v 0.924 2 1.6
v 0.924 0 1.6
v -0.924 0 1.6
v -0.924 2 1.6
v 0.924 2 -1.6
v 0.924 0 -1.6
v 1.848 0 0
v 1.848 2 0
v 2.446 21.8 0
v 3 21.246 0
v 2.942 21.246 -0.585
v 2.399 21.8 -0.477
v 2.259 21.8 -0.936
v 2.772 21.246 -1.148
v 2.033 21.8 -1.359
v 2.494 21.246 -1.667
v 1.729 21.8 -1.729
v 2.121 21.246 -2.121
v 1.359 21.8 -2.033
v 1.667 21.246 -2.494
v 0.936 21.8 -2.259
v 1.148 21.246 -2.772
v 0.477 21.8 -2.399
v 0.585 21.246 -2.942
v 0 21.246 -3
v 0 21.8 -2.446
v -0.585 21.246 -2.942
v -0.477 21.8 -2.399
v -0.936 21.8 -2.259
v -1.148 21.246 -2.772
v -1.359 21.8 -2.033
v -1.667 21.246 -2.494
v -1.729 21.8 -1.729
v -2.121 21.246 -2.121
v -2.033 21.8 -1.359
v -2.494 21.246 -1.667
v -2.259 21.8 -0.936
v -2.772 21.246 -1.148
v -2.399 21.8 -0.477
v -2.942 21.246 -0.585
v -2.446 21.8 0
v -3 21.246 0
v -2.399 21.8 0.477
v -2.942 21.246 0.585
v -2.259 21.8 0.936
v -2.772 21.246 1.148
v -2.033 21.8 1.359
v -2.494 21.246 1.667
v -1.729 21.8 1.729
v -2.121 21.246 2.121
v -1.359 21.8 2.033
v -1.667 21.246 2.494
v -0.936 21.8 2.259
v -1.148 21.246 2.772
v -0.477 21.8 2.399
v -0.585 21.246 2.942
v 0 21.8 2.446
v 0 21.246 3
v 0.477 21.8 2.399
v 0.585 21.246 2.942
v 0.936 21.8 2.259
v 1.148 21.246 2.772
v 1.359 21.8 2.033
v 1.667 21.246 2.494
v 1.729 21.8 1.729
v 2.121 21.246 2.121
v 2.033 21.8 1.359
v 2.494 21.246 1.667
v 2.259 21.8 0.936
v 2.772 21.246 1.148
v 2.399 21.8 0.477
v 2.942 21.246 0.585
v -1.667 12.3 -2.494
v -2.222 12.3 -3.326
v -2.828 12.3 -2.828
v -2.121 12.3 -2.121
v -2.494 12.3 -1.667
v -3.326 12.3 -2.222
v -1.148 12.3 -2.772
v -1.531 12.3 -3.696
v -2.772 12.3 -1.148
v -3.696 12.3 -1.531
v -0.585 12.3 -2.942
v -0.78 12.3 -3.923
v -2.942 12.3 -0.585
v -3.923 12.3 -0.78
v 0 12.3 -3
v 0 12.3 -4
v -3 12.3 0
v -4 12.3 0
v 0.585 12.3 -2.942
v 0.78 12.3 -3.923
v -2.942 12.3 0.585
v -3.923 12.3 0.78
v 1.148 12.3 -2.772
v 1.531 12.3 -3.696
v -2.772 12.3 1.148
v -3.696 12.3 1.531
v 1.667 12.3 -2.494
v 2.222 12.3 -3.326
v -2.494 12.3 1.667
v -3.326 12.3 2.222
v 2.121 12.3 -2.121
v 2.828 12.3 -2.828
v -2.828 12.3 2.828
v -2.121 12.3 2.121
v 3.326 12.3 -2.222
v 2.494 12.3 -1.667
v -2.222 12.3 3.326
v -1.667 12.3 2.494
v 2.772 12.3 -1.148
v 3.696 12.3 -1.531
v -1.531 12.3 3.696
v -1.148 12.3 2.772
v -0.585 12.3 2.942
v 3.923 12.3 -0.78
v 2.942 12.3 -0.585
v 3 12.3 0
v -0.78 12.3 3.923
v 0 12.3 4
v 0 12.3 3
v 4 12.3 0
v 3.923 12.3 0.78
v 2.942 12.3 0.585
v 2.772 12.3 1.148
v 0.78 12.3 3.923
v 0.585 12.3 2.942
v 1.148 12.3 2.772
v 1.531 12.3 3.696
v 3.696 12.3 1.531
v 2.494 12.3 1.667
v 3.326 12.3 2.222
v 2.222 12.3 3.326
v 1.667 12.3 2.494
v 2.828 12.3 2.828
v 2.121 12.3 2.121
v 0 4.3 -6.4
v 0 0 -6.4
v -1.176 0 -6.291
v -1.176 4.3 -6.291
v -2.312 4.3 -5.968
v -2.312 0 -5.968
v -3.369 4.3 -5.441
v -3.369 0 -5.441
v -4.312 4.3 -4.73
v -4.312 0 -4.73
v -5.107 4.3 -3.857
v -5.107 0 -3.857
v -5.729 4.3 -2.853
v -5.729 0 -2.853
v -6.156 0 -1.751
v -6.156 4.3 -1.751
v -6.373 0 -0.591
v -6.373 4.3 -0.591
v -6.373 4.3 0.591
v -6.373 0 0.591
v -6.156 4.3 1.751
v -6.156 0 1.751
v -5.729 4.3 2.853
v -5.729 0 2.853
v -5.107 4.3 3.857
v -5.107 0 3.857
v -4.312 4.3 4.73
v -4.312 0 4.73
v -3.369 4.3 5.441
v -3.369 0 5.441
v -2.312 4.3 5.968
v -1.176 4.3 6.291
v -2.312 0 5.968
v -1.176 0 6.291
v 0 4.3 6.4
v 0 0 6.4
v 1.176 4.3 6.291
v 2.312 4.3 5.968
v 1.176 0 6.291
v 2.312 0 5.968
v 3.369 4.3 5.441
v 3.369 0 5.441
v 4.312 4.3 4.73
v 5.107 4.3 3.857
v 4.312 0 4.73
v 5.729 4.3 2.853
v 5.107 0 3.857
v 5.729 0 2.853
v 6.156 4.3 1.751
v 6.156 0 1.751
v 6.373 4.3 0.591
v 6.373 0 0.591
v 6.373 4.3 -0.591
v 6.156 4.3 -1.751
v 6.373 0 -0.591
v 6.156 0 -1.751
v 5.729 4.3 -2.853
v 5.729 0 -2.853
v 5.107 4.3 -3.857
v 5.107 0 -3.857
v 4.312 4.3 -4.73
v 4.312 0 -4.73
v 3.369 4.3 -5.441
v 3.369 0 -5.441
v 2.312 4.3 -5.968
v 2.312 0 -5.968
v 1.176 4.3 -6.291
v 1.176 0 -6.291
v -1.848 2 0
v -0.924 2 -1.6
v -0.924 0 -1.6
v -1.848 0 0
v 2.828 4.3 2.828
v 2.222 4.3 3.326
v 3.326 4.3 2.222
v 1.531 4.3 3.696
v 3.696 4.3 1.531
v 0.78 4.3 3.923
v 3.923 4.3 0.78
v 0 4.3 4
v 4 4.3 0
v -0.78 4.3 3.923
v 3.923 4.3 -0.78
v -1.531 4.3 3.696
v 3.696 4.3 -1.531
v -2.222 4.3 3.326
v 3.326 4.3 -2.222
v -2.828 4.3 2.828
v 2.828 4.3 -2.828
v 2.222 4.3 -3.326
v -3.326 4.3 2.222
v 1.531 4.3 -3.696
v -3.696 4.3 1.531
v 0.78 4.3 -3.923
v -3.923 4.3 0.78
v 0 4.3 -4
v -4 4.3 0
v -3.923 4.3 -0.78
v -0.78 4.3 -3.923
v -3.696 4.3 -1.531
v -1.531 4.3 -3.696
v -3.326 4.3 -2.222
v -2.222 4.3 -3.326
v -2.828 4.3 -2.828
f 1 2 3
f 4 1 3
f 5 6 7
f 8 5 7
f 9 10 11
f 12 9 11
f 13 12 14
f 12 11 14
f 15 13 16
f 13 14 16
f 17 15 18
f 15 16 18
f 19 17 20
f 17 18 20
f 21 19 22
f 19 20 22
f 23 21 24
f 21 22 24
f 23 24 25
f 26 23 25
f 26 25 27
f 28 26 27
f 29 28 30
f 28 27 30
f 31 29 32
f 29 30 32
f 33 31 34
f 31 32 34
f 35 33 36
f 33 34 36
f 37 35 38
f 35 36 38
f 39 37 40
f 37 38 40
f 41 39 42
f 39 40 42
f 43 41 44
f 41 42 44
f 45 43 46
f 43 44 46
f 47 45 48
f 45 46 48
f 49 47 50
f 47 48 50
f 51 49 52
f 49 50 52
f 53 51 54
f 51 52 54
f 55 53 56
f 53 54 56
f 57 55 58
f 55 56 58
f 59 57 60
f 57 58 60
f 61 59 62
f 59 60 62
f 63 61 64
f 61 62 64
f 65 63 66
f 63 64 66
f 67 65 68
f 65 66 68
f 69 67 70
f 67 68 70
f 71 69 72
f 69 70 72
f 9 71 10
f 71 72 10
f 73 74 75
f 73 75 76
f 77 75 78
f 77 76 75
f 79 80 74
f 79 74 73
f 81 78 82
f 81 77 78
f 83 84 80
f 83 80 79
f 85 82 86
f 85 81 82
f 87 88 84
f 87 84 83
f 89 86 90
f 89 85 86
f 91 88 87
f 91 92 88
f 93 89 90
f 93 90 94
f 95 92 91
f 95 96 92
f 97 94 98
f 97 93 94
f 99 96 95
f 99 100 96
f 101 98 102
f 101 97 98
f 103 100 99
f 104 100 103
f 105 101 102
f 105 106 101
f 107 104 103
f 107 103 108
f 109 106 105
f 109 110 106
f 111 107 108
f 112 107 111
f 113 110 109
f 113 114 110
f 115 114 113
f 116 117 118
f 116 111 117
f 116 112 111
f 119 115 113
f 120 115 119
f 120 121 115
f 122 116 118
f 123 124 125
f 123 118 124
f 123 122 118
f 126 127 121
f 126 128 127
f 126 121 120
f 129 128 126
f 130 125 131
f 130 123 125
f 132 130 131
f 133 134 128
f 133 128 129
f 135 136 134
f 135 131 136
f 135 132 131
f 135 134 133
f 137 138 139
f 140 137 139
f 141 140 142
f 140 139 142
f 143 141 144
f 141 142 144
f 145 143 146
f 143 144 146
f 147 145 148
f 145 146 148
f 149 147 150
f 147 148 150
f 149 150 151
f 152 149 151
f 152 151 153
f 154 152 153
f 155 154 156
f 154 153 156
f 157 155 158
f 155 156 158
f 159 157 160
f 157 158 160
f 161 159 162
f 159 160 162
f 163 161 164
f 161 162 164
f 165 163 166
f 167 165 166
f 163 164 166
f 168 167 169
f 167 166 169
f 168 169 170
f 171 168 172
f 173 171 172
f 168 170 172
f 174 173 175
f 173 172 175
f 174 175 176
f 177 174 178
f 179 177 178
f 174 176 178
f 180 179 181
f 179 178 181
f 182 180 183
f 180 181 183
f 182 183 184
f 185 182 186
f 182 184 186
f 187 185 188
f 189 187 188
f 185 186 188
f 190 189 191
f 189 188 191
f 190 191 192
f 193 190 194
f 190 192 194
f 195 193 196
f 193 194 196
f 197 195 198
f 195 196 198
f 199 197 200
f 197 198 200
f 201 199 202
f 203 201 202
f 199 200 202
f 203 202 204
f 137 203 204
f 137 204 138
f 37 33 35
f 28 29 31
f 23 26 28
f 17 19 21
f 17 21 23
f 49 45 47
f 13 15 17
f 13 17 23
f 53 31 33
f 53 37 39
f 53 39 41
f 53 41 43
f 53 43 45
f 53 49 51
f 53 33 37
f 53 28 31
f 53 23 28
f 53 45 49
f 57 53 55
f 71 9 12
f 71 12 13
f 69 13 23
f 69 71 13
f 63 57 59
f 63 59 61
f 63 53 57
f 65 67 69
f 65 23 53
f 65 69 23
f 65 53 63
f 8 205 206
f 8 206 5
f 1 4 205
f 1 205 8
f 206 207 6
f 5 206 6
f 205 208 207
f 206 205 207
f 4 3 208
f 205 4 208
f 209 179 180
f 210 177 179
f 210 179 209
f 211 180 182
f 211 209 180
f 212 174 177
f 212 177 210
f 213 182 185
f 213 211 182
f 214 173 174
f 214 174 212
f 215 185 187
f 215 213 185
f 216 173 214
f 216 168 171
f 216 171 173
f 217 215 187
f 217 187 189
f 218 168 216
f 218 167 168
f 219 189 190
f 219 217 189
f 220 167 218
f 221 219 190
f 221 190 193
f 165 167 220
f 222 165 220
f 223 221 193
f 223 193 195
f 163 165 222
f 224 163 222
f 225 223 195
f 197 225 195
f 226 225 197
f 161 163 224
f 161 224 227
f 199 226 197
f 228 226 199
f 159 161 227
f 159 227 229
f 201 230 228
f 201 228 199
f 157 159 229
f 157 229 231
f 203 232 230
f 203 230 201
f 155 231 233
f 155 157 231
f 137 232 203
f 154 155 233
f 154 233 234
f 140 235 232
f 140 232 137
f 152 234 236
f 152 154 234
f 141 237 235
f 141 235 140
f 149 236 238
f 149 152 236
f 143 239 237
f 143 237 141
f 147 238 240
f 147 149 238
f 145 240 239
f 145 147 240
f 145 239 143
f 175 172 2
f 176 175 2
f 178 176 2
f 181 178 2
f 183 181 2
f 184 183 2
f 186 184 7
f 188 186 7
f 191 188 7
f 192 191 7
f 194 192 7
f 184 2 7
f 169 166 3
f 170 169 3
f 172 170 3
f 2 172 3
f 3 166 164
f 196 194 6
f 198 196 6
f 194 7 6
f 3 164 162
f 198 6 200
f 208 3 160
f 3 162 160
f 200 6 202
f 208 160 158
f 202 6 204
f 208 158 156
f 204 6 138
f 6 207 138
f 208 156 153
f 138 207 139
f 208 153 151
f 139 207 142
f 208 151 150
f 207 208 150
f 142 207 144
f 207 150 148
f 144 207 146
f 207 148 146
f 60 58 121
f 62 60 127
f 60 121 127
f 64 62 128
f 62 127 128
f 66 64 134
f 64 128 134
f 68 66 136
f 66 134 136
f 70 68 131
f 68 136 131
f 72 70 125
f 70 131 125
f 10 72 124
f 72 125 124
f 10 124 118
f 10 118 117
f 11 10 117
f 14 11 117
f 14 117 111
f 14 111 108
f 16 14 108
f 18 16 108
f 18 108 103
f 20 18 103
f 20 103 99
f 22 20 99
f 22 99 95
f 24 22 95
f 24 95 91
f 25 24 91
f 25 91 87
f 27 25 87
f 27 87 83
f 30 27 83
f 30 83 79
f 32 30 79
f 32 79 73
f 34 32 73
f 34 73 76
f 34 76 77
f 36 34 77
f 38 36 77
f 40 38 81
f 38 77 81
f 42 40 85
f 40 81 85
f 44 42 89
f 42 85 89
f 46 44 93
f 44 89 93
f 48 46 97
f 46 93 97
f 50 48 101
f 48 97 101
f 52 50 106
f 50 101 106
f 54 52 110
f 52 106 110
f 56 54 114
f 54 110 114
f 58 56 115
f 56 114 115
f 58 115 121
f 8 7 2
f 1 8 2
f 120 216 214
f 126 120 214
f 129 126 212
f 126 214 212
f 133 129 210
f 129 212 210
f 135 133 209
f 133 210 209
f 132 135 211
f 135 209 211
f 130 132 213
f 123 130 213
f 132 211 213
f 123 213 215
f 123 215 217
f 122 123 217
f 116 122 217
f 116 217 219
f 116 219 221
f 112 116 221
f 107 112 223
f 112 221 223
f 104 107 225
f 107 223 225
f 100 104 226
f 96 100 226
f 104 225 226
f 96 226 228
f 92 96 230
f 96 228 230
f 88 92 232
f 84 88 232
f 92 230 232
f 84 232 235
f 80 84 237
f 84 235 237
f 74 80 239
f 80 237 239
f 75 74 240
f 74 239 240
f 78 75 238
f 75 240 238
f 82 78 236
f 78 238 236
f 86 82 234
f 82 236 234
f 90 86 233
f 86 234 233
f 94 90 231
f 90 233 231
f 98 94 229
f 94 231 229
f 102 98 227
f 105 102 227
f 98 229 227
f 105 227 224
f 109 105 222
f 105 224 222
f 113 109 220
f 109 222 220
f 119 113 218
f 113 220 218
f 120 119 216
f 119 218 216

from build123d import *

# Parameters (mm, degrees)
SKETCH_1_R          = 6.4
EXTRUDE_1_DEPTH     = 4.3
SKETCH_2_R          = 4
EXTRUDE_2_DEPTH     = 8
SKETCH_3_R          = 3
EXTRUDE_3_DEPTH     = 9.5
CUT_EXTRUDE_1_DEPTH = 2


# Read off the part's stored shape, not the designer's step: M6x1.0 机械螺纹 螺柱1
with BuildPart() as part:
    # 草图1 → 凸台-拉伸1 (new body)
    with BuildSketch(Plane(origin=(0, 0, 0), x_dir=(1, 0, 0), z_dir=(0, 1, 0))):
        with Locations(Location((0, 0, 0), (0, 0, 90))):
            Circle(SKETCH_1_R)
    extrude(amount=EXTRUDE_1_DEPTH)

    # 草图2 → 凸台-拉伸2 (add)
    with BuildSketch(Plane(origin=(0, 4.3, 0), x_dir=(1, 0, 0), z_dir=(0, 1, 0))):
        with Locations(Location((0, 0, 0), (0, 0, 270))):
            Circle(SKETCH_2_R)
    extrude(amount=EXTRUDE_2_DEPTH)

    # 草图3 → 凸台-拉伸3 (add)
    with BuildSketch(Plane(origin=(0, 12.3, 0), x_dir=(1, 0, 0), z_dir=(0, 1, 0))):
        with Locations(Location((0, 0, 0), (0, 0, 270))):
            Circle(SKETCH_3_R)
    extrude(amount=EXTRUDE_3_DEPTH)

    # M6x1.0 机械螺纹 螺柱1 outline → M6x1.0 机械螺纹 螺柱1 (revolve, cut)
    with BuildSketch(Plane.XY):
        Polygon((3, 21.8), (2.4455, 21.8), (3, 21.2455), align=None)
    revolve(axis=Axis((0, 0, 0), (0, 1, 0)), mode=Mode.SUBTRACT)

    # 草图5 → 切除-拉伸1 (cut)
    with BuildSketch(Plane.XZ):
        Polygon((1.847520861, 0), (0.923760431, 1.6), (-0.923760431, 1.6), (-1.847520861, 0), (-0.923760431, -1.6), (0.923760431, -1.6), align=None)
    extrude(amount=-CUT_EXTRUDE_1_DEPTH, mode=Mode.SUBTRACT)


solid = part.part
